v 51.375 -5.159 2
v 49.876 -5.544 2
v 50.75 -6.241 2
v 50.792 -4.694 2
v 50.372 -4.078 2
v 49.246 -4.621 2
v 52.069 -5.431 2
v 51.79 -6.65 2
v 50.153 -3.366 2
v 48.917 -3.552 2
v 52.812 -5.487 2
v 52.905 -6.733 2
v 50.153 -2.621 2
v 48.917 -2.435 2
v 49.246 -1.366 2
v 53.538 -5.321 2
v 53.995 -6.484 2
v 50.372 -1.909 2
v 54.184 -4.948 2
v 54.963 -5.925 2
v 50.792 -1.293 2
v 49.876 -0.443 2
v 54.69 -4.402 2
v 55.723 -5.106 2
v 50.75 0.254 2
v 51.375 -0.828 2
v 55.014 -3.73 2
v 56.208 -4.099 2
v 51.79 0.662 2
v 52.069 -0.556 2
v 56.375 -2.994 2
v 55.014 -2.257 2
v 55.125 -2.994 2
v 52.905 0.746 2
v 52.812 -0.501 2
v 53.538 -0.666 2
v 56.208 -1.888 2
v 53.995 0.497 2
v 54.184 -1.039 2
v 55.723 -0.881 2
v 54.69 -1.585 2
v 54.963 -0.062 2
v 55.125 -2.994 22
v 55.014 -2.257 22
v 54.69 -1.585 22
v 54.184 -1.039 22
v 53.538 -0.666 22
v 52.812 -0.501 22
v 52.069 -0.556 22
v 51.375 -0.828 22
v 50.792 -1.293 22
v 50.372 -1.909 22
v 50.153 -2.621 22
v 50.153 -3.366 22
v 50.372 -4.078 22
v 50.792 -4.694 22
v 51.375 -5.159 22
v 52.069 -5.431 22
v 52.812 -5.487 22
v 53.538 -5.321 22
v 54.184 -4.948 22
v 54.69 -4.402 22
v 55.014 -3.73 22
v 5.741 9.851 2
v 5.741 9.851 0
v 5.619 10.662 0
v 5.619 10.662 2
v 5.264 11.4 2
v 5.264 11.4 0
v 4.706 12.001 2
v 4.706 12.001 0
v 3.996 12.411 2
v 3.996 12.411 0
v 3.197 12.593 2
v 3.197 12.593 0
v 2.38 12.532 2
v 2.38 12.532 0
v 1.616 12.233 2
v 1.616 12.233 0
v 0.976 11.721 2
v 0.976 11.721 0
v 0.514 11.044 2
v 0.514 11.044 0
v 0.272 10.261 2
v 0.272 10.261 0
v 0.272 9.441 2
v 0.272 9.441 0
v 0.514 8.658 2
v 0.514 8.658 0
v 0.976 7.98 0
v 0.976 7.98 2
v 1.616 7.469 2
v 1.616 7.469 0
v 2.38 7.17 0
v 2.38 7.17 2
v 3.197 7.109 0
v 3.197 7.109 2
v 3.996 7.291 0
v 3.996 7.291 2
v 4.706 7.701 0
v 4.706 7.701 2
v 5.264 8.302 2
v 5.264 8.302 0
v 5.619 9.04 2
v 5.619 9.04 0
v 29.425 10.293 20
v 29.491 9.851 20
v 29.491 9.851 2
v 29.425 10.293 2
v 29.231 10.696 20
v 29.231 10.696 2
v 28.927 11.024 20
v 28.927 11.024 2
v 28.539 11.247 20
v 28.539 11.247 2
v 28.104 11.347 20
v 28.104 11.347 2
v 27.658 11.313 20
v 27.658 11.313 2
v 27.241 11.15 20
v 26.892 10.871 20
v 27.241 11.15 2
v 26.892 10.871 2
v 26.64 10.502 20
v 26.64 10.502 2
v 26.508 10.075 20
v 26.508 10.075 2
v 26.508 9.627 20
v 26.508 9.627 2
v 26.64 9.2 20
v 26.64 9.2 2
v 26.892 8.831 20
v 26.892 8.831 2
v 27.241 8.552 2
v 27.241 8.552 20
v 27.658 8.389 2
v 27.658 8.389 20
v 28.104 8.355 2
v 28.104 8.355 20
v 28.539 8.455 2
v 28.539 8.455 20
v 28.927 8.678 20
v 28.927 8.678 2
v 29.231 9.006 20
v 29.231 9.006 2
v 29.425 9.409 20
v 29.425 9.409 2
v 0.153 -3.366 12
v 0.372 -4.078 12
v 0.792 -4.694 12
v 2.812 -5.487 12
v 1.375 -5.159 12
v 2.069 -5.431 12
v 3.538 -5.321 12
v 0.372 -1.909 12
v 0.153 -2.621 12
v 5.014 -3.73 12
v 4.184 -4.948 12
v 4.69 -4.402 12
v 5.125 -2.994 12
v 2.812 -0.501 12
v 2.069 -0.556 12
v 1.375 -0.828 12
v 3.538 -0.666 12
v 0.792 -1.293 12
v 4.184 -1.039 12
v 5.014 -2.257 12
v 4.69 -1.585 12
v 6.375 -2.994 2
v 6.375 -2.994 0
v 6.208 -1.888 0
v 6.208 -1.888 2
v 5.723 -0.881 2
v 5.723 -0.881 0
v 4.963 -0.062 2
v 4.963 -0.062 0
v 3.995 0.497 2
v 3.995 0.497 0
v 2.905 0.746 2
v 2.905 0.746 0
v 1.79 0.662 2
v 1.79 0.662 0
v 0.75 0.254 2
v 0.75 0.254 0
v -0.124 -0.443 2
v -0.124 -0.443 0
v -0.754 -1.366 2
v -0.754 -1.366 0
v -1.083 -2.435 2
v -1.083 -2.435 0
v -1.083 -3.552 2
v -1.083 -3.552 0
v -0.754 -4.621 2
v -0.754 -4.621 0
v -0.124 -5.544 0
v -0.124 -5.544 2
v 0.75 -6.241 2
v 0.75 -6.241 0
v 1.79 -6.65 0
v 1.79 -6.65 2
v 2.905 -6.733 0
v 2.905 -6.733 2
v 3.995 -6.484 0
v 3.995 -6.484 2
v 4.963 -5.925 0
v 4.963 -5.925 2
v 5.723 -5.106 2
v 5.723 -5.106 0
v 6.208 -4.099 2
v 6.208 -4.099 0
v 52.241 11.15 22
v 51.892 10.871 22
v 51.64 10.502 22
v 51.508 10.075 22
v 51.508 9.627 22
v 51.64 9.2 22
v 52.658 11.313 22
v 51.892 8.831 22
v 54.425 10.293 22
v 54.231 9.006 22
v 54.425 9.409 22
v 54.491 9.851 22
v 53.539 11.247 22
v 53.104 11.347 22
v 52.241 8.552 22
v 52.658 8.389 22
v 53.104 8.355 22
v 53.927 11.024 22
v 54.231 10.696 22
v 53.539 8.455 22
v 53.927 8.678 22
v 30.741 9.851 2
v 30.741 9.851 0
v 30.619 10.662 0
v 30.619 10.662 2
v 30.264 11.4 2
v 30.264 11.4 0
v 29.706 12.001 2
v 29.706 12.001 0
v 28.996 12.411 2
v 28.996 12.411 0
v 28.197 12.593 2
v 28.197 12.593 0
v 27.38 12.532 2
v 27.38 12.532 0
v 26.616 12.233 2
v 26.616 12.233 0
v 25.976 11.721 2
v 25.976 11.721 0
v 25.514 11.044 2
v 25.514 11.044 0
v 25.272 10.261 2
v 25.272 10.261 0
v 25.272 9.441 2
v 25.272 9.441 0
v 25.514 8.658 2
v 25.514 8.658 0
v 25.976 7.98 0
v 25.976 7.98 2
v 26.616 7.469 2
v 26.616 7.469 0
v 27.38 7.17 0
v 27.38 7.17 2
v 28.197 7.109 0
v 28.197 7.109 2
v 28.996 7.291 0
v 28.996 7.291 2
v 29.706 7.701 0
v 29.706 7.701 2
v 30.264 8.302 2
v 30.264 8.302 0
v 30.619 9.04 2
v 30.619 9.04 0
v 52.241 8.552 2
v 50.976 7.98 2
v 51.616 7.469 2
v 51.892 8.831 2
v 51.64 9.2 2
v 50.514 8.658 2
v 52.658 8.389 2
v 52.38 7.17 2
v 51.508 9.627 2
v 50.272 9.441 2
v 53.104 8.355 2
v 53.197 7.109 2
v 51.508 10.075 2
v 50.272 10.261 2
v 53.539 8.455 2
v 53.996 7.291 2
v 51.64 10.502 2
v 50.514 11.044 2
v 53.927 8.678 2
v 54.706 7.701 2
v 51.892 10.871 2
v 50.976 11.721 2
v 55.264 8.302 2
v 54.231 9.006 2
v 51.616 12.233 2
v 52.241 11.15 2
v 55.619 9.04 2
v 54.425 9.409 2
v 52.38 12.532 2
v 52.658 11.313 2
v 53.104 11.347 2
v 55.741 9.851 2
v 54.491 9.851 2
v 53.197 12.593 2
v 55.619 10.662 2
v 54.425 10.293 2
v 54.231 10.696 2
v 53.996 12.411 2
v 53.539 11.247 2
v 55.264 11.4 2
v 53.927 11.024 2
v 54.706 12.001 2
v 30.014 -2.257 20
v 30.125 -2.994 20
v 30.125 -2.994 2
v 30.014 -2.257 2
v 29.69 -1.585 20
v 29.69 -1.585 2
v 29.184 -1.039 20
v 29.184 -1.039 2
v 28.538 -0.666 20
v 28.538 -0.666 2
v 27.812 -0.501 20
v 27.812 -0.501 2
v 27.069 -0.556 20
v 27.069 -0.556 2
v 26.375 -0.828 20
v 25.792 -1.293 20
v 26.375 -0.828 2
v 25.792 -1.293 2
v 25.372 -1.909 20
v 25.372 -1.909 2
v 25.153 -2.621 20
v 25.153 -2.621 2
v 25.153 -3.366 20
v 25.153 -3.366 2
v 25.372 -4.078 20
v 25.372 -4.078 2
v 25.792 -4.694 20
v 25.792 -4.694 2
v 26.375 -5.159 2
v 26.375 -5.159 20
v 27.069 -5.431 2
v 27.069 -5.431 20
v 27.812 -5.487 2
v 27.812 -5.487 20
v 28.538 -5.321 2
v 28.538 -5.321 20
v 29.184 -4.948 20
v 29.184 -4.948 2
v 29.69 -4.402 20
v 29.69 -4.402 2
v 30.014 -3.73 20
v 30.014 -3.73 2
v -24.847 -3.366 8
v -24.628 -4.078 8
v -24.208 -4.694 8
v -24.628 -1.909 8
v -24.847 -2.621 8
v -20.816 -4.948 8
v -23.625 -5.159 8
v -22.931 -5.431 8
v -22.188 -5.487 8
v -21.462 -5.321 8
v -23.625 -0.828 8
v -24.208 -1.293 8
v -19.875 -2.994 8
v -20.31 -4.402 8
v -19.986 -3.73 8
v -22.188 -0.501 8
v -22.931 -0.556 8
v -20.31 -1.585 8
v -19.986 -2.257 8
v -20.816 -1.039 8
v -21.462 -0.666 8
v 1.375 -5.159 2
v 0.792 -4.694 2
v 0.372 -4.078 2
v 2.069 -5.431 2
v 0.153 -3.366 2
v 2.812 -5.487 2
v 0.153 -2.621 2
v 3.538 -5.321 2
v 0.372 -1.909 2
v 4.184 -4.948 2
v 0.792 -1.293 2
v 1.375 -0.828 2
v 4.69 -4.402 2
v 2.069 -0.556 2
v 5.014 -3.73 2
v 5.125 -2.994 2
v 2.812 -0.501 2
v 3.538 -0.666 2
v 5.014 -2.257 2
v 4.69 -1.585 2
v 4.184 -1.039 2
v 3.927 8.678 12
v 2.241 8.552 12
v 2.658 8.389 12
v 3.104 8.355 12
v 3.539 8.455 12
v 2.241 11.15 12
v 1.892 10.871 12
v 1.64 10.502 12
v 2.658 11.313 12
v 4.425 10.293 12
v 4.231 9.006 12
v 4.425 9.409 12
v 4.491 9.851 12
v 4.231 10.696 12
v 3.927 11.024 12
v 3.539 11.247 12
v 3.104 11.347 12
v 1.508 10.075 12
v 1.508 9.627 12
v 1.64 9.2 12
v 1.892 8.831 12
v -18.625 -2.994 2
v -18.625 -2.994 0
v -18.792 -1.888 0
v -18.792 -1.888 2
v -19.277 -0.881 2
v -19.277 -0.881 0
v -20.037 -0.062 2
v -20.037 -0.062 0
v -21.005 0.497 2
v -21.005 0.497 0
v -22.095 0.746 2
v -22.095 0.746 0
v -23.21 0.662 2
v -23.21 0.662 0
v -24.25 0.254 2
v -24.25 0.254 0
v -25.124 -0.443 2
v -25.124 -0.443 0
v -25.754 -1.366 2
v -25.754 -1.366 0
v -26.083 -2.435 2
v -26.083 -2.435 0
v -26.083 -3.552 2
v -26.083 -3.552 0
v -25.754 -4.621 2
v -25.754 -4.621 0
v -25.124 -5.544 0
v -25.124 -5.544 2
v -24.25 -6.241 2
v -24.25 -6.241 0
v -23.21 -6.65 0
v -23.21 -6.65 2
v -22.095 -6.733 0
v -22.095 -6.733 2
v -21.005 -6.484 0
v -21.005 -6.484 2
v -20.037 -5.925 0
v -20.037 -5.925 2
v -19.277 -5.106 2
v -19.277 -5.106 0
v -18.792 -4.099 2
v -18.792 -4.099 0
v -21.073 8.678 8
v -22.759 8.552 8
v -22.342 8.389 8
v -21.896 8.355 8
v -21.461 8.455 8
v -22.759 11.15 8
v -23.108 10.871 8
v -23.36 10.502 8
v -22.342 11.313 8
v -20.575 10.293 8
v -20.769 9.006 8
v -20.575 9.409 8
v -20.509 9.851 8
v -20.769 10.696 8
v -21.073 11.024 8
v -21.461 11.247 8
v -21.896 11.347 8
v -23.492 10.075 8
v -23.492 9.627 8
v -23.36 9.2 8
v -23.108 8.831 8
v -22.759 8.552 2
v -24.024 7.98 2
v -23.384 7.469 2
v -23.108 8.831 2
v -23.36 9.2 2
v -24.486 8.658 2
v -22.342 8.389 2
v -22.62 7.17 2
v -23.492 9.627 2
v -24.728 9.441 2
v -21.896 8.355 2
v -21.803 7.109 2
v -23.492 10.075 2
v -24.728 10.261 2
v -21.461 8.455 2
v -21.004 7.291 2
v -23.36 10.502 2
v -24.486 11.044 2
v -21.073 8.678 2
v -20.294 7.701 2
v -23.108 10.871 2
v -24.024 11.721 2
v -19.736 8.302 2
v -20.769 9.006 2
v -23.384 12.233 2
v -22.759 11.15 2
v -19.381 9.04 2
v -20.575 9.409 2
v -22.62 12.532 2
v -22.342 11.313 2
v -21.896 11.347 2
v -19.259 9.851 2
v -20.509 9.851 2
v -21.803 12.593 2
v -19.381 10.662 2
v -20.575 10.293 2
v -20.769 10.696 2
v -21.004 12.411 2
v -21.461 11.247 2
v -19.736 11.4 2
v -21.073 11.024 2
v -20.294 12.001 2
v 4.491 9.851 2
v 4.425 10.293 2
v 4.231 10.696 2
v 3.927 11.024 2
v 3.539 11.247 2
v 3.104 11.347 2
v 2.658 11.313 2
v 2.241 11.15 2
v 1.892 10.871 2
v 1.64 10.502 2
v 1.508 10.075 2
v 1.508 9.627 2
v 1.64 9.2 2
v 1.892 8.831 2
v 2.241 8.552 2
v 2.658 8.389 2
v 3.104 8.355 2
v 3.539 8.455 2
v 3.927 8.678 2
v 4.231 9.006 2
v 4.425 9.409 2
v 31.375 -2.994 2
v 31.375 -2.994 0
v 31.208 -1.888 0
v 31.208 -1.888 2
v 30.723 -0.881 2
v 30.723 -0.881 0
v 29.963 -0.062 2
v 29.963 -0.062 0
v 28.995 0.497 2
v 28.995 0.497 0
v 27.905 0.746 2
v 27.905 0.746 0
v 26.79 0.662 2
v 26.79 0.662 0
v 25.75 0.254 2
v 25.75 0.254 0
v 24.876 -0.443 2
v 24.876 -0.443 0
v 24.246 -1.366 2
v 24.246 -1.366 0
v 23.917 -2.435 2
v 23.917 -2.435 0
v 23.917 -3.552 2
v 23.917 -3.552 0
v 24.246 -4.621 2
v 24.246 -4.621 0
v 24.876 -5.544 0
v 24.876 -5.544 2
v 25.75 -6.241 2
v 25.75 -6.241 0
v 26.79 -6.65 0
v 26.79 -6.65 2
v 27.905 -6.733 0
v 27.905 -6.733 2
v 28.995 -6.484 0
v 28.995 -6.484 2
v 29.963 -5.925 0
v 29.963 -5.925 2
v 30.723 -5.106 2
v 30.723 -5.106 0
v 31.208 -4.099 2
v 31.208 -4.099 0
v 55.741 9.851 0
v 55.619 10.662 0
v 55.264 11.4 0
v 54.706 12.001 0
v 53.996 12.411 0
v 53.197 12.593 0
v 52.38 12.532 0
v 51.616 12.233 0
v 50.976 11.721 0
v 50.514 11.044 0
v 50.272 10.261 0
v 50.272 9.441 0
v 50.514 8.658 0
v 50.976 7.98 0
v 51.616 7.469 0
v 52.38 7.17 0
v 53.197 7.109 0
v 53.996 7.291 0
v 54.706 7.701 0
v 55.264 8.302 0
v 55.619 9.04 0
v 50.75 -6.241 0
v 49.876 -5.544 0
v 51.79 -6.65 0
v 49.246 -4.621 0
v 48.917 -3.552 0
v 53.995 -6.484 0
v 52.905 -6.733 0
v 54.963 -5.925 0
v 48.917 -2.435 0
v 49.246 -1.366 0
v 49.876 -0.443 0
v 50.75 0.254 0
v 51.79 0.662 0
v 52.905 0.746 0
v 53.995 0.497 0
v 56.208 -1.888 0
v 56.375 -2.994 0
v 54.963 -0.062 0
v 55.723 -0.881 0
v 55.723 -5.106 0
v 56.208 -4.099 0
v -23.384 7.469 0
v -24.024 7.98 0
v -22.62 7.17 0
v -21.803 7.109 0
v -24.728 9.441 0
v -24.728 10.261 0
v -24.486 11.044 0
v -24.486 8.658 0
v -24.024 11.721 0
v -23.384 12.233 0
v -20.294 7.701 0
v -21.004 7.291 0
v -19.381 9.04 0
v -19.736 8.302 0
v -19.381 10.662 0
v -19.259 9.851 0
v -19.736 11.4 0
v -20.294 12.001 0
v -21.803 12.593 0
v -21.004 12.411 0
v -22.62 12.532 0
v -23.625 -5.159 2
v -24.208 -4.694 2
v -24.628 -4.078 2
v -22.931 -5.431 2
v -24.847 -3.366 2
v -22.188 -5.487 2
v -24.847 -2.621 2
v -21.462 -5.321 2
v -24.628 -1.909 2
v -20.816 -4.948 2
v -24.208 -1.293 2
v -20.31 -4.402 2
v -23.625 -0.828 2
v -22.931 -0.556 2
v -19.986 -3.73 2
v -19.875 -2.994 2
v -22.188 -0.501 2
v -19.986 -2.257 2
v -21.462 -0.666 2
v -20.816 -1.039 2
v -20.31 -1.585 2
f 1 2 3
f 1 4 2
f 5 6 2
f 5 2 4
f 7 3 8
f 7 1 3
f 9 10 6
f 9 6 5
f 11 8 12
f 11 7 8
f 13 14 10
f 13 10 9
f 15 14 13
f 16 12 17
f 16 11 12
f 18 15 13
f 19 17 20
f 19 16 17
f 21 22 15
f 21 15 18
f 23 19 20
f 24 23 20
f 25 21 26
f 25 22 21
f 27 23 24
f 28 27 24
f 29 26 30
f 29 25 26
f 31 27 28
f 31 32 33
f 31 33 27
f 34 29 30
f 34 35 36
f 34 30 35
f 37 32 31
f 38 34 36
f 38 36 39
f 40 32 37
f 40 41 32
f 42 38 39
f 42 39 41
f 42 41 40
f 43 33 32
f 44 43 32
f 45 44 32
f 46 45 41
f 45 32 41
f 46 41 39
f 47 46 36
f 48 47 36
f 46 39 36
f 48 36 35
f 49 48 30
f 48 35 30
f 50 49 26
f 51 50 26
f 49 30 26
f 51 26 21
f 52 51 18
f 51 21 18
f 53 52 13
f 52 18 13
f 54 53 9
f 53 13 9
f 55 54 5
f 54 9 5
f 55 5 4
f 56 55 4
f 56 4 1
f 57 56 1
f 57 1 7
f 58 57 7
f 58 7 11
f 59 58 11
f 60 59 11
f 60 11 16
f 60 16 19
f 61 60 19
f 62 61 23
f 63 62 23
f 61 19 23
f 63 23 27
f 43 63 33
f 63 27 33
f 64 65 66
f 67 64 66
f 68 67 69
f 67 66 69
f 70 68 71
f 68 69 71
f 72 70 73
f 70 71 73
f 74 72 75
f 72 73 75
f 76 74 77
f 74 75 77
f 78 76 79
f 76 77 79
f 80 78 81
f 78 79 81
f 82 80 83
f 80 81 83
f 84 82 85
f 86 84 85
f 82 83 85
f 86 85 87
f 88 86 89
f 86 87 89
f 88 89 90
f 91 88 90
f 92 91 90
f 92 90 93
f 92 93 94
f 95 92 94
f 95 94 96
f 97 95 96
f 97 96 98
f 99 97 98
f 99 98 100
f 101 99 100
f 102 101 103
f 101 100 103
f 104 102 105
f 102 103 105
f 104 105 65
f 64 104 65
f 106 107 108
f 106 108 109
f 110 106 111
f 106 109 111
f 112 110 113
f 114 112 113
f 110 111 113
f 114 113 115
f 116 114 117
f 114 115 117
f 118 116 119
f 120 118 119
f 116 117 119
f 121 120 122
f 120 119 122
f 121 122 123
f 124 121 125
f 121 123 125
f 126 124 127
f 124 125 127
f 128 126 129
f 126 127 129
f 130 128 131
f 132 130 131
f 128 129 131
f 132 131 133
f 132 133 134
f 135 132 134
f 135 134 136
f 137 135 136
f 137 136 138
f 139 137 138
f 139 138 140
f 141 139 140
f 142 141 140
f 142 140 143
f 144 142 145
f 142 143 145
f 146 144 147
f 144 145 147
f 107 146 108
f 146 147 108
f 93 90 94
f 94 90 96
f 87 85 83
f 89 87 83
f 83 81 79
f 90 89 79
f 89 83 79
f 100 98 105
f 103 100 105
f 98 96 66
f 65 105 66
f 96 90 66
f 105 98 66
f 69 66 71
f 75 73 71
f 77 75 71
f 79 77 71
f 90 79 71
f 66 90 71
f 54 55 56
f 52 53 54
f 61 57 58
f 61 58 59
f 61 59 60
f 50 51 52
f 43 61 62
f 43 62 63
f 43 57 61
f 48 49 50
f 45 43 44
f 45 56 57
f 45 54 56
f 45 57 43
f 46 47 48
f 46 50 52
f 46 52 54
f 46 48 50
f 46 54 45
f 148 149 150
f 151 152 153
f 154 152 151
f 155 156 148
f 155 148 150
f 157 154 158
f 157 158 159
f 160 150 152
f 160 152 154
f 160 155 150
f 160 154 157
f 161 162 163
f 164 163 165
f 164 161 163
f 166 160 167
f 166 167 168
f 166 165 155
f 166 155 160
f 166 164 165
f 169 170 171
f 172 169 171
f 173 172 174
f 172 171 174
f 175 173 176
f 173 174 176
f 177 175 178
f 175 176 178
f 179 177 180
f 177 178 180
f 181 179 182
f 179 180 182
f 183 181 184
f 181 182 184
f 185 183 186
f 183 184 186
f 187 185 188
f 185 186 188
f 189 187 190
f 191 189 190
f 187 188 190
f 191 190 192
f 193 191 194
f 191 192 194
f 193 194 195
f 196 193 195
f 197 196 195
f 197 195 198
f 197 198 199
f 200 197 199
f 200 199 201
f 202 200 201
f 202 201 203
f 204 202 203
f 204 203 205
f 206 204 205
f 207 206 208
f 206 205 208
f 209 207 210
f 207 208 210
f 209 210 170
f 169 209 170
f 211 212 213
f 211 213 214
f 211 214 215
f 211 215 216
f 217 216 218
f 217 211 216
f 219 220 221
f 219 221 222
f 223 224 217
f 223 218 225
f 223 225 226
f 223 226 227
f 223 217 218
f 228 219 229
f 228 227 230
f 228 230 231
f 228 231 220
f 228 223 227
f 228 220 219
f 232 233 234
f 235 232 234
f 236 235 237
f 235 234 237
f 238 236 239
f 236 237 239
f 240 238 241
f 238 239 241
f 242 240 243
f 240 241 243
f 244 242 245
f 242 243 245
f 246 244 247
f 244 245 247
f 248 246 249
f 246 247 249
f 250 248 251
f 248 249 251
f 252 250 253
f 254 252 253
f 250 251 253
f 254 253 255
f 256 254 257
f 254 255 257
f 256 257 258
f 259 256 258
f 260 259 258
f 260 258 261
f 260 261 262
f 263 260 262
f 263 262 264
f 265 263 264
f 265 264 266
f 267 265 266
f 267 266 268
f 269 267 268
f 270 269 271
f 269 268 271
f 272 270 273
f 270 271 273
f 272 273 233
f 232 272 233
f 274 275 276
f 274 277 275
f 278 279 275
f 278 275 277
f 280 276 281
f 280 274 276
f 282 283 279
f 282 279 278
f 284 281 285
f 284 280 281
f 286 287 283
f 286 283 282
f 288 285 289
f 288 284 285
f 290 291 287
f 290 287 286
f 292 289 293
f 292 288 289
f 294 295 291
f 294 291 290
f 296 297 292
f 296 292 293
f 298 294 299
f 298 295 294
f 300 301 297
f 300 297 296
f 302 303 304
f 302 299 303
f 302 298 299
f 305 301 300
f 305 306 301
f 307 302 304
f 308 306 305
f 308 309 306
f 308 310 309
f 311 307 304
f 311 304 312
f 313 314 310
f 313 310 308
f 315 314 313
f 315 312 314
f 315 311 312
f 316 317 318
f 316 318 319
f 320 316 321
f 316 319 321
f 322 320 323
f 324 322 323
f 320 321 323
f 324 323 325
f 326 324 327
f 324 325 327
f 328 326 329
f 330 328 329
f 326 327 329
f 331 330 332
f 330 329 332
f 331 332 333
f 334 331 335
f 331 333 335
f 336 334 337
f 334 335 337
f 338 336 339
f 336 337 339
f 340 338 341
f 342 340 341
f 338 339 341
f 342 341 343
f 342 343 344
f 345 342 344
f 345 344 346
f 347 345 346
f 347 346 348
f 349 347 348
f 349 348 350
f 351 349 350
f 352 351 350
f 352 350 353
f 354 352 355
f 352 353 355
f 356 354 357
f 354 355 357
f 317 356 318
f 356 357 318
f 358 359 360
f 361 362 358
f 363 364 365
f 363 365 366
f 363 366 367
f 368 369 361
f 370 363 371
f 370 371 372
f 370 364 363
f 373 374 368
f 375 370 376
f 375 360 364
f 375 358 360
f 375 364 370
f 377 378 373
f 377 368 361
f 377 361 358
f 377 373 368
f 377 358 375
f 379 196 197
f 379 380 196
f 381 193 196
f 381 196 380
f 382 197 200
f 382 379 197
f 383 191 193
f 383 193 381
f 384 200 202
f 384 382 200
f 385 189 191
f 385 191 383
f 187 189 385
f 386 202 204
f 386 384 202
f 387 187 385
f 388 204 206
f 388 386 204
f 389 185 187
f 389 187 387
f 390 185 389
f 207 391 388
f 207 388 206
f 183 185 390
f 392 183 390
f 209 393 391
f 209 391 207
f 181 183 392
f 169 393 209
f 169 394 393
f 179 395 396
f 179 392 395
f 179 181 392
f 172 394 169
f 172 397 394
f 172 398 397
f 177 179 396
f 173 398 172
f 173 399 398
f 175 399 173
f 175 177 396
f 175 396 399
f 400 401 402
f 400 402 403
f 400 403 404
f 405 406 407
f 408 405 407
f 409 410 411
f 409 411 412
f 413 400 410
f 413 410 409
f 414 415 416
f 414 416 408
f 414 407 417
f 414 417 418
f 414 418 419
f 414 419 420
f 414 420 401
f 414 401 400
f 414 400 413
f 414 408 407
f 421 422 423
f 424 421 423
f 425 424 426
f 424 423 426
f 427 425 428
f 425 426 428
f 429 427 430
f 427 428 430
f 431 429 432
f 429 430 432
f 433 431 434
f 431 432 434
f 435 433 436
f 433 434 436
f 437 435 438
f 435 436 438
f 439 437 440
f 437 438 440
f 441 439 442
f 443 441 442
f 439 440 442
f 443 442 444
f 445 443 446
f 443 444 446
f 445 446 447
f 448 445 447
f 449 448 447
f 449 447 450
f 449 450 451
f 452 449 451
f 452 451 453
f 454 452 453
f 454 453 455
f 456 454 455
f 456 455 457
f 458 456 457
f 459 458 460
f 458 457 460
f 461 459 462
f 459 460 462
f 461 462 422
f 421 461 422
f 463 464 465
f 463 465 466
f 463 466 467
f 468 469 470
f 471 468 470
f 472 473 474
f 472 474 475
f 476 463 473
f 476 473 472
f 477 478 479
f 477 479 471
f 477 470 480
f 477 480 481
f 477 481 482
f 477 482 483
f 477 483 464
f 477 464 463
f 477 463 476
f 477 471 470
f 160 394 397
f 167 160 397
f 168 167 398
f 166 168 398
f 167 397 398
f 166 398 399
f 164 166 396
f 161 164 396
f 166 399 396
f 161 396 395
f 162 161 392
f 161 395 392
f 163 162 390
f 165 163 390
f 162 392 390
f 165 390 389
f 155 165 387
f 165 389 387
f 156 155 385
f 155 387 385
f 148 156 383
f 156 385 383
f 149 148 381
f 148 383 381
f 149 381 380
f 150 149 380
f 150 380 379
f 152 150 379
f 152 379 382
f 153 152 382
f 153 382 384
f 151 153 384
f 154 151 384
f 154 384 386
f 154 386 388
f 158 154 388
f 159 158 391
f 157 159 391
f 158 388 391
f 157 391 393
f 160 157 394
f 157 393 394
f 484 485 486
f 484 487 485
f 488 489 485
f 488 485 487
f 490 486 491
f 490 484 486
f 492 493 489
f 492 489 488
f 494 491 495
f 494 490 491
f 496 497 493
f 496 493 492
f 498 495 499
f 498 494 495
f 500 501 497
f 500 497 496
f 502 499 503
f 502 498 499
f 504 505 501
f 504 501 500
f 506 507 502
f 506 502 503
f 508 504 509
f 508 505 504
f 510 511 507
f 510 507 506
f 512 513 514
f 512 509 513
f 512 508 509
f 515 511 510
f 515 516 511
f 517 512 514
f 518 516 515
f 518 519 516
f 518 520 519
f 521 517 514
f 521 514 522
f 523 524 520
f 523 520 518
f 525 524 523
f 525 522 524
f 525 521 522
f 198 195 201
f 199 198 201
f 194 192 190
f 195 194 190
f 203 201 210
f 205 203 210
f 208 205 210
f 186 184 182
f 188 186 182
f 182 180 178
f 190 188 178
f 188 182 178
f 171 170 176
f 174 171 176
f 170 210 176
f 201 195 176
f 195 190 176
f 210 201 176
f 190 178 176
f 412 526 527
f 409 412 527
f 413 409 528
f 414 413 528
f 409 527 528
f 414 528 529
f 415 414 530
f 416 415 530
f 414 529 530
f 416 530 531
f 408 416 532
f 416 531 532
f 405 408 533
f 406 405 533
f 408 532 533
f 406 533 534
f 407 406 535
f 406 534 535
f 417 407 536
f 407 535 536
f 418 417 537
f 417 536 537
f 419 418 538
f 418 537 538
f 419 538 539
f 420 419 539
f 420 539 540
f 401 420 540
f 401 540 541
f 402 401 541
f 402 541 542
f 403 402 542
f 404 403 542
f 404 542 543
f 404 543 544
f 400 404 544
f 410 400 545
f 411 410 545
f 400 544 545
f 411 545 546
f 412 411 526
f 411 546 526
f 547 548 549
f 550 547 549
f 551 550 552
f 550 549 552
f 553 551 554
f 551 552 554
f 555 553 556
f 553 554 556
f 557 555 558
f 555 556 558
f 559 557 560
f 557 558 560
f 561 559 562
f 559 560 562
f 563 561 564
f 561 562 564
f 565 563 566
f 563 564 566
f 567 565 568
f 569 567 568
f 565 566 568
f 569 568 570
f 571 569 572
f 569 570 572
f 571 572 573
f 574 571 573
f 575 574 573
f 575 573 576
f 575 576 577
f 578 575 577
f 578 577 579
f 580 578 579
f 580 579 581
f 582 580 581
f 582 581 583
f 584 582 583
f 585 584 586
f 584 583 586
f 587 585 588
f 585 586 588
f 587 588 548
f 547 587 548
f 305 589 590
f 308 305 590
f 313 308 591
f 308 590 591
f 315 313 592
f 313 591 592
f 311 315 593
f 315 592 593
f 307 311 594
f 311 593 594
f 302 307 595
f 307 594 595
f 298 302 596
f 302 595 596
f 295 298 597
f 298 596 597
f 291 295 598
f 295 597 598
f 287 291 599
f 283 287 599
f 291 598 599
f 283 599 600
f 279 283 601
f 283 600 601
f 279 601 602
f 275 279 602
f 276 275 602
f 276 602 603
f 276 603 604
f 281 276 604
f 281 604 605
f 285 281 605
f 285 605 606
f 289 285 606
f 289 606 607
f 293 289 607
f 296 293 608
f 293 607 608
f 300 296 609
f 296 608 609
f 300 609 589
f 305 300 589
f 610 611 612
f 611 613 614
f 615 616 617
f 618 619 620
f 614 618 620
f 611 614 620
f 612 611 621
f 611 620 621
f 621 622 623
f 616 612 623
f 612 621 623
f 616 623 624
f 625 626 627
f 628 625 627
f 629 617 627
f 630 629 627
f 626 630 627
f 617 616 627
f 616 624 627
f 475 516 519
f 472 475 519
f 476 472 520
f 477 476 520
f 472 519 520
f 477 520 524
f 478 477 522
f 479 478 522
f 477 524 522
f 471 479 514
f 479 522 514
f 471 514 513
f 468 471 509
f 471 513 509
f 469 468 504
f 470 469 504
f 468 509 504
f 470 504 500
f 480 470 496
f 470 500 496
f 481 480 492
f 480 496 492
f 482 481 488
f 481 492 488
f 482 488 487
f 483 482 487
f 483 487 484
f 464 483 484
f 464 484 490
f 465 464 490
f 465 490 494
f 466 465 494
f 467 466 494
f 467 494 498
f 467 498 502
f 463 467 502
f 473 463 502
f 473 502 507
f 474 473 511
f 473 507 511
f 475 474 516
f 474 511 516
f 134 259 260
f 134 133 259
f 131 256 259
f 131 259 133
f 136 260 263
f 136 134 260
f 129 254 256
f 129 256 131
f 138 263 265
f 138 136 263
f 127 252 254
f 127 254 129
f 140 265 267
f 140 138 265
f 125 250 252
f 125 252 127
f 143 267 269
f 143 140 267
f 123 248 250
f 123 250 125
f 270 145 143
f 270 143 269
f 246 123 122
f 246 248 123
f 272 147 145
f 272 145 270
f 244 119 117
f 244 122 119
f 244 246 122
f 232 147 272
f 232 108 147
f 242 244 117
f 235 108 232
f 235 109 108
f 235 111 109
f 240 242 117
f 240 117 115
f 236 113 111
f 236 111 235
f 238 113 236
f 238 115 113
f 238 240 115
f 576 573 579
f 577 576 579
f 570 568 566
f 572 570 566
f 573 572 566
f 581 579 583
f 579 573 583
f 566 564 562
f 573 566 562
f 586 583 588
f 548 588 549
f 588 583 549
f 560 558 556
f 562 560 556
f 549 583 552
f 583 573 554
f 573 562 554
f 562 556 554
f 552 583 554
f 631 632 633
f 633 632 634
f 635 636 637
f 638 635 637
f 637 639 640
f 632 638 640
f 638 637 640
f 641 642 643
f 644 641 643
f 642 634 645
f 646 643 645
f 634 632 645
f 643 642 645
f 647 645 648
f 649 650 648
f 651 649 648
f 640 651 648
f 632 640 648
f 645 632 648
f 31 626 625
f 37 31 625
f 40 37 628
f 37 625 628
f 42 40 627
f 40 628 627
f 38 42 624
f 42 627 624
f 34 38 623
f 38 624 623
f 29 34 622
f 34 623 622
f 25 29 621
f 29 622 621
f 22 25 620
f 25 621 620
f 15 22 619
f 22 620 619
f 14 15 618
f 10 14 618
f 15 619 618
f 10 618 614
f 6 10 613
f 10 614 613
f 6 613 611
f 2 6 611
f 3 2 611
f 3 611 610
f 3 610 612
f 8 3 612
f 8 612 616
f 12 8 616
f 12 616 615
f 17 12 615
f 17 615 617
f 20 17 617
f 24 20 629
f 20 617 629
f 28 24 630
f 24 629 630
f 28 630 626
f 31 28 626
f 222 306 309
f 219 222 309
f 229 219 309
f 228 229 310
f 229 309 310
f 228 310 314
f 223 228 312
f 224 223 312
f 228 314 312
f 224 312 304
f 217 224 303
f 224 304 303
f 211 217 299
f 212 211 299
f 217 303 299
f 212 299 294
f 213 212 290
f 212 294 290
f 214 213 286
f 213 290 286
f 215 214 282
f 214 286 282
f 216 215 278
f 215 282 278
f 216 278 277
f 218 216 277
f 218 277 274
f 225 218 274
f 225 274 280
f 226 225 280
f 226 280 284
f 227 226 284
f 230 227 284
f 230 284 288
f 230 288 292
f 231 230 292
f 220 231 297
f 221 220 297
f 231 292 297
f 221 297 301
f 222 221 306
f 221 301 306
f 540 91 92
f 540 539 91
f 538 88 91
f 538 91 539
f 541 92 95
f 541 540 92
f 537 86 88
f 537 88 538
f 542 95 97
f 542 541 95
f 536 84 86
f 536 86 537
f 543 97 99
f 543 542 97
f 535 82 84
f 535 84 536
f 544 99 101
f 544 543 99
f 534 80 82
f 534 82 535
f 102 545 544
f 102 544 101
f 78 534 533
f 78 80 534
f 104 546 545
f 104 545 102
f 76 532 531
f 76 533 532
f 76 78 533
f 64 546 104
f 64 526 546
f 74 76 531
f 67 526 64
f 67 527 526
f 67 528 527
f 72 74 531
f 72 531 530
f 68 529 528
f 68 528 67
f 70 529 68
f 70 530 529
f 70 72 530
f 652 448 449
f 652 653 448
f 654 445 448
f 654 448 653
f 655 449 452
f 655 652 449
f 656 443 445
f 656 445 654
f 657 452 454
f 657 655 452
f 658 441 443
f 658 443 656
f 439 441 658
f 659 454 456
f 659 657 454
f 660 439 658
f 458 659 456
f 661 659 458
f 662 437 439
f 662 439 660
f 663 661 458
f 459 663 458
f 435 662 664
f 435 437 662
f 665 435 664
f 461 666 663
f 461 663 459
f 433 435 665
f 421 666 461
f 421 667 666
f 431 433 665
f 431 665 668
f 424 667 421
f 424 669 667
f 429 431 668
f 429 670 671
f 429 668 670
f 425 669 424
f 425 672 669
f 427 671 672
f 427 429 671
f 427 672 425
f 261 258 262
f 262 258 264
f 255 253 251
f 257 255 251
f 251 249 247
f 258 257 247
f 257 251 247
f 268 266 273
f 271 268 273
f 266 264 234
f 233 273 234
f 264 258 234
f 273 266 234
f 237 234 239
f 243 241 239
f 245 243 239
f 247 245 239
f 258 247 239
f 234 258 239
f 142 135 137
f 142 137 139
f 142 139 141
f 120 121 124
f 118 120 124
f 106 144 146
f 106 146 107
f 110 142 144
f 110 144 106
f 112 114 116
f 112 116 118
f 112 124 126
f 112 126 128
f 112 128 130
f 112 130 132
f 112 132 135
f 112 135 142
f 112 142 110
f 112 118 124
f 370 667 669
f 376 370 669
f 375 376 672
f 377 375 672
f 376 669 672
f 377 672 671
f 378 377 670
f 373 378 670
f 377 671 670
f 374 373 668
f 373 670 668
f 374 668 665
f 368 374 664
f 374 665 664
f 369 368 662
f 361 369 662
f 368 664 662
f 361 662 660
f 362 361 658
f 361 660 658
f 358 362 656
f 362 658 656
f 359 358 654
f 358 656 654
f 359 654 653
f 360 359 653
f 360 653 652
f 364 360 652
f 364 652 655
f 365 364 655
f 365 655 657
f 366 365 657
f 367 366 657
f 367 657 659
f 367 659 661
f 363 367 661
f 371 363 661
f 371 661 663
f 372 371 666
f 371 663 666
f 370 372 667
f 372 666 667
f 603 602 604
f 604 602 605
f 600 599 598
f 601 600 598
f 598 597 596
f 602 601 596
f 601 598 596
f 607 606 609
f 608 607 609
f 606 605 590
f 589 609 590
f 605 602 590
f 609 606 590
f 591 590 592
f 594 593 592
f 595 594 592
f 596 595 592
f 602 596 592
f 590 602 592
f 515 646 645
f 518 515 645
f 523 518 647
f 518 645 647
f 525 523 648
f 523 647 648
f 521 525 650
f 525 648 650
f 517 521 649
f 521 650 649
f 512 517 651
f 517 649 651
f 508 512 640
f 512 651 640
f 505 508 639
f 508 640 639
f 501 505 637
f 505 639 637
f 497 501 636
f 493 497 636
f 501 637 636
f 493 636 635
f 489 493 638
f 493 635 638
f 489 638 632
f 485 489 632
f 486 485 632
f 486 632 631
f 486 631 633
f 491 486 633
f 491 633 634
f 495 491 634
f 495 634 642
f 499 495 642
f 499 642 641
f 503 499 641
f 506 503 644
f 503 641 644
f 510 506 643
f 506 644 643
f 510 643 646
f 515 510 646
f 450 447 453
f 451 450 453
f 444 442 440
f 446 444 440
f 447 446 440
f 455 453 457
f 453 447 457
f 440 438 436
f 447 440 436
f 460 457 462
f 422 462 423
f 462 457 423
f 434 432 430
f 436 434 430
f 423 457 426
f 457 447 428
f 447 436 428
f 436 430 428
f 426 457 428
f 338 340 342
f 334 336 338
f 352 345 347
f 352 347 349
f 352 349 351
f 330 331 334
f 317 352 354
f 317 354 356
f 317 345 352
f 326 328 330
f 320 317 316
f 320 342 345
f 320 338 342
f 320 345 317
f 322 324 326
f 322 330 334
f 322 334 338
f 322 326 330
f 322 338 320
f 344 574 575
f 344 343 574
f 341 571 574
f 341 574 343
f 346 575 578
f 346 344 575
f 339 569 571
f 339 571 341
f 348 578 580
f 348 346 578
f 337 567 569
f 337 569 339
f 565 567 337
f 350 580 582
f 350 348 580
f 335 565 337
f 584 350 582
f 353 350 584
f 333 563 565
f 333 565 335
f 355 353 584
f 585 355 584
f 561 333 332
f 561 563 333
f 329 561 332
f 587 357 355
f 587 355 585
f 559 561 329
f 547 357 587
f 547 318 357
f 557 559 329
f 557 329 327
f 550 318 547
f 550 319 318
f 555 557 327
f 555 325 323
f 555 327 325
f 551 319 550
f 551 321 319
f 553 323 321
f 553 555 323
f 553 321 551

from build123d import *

# Parameters (mm, degrees)
F0_R     = 2.75
F0_R_2   = 3.75
F1_DEPTH = 2
F2_R     = 1.5
F3_R     = 2.5
F4_DEPTH = 6
F5_DEPTH = 10
F6_DEPTH = 18
F7_DEPTH = 20


with BuildPart() as f1:
    # F0 (on Top) → F1 (new body)
    with BuildSketch(Plane.XY):
        with Locations((-22.008536, 9.850945)):
            Circle(F0_R)
        with Locations((2.991464, 9.850945)):
            Circle(F0_R)
        with Locations((27.991464, 9.850945)):
            Circle(F0_R)
        with Locations((-22.375159, -2.993529)):
            Circle(F0_R_2)
        with Locations((27.624841, -2.993529)):
            Circle(F0_R_2)
        with Locations((52.991464, 9.850945)):
            Circle(F0_R)
        with Locations((2.624841, -2.993529)):
            Circle(F0_R_2)
        with Locations((52.624841, -2.993529)):
            Circle(F0_R_2)
    extrude(amount=F1_DEPTH)

    # F2 (on face) + F3 (on face) → F4 (join)
    with BuildSketch(Plane.XY.offset(2)):
        with Locations((-22.008536, 9.850945)):
            Circle(F2_R)
    with BuildSketch(Plane.XY.offset(2)):
        with Locations((-22.375159, -2.993529)):
            Circle(F3_R)
    extrude(amount=F4_DEPTH)

    # F3 (on face) + F2 (on face) → F5 (join)
    with BuildSketch(Plane.XY.offset(2)):
        with Locations((2.624841, -2.993529)):
            Circle(F3_R)
    with BuildSketch(Plane.XY.offset(2)):
        with Locations((2.991464, 9.850945)):
            Circle(F2_R)
    extrude(amount=F5_DEPTH)

    # F2 (on face) + F3 (on face) → F6 (join)
    with BuildSketch(Plane.XY.offset(2)):
        with Locations((27.991464, 9.850945)):
            Circle(F2_R)
    with BuildSketch(Plane.XY.offset(2)):
        with Locations((27.624841, -2.993529)):
            Circle(F3_R)
    extrude(amount=F6_DEPTH)

    # F2 (on face) + F3 (on face) → F7 (join)
    with BuildSketch(Plane.XY.offset(2)):
        with Locations((52.991464, 9.850945)):
            Circle(F2_R)
    with BuildSketch(Plane.XY.offset(2)):
        with Locations((52.624841, -2.993529)):
            Circle(F3_R)
    extrude(amount=F7_DEPTH)


solid = f1.part
